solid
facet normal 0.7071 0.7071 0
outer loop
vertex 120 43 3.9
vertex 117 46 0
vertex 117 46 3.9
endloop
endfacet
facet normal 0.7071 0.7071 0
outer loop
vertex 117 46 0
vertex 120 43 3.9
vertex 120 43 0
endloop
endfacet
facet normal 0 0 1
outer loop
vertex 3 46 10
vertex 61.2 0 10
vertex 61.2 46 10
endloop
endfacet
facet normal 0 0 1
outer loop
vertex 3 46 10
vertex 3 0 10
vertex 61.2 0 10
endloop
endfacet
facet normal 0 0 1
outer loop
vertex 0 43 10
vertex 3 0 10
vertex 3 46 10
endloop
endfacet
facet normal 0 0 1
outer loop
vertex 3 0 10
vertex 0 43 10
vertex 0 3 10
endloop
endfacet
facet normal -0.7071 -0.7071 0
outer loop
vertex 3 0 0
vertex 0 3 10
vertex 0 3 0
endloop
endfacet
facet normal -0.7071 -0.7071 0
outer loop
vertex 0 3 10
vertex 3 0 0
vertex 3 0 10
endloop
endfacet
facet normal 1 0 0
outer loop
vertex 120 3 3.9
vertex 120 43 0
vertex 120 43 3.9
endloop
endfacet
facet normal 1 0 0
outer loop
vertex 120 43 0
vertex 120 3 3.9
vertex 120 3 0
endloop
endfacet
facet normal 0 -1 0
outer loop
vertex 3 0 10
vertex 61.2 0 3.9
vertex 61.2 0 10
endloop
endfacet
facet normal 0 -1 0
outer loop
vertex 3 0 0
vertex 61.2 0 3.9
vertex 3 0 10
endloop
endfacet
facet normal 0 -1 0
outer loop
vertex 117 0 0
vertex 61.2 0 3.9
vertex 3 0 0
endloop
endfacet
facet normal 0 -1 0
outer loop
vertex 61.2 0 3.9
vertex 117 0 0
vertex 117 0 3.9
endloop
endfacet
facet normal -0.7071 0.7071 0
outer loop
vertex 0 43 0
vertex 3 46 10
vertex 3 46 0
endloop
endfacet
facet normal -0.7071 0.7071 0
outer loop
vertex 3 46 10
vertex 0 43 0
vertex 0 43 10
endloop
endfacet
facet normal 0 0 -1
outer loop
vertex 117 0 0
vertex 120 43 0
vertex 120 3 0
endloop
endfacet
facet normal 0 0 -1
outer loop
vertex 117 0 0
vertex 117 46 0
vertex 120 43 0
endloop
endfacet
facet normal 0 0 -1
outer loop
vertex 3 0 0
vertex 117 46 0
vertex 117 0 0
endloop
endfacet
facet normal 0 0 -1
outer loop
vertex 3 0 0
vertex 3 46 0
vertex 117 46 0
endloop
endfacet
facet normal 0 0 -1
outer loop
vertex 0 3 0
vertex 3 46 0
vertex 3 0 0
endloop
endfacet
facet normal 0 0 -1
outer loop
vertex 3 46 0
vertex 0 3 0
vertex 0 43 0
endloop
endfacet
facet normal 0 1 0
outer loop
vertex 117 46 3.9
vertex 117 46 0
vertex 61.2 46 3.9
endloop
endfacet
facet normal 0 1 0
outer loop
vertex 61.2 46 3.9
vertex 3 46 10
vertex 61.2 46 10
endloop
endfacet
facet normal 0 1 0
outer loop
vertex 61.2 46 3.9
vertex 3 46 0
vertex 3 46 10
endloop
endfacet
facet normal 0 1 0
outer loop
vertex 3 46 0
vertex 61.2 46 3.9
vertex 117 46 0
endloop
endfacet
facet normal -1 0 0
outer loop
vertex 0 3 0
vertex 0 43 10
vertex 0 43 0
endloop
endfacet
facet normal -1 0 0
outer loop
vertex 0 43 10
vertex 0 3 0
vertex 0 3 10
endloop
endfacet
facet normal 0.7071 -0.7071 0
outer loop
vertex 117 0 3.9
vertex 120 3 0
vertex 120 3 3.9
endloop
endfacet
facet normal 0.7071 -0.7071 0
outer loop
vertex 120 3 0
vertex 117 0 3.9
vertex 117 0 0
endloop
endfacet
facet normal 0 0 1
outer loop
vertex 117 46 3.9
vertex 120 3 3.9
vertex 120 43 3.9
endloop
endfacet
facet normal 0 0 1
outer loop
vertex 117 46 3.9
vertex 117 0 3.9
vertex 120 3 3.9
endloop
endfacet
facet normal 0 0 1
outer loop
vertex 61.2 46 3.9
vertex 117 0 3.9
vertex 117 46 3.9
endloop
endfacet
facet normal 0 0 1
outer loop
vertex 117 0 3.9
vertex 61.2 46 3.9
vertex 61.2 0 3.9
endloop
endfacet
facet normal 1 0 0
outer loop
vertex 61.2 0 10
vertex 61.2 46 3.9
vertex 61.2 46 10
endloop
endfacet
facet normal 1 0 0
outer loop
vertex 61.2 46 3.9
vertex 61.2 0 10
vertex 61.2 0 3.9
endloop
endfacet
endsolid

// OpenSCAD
$fn = 32;

// ----------------------------------------------------------------------
// Stepped bar: endstep, 120 x 46 x 10/3.9 mm
// ----------------------------------------------------------------------

// --- parameters (mm) ---
bar_l = 120;              // bar length, X
bar_w = 46;               // bar width, Y
plate_t = 10;             // thickness of the thick zone, Z
thin_t = 3.9;             // thickness of the thin zone
corner_c = 3;             // corner chamfer of the bar
step_cut = 6.1;           // material removed from the thin zone
step_x = 61.2;            // step position from the left end
depth_1 = 6.1;            // depth of cut 1 from the top face

profile = [[3, 0], [117, 0], [120, 3], [120, 43], [117, 46], [3, 46], [0, 43], [0, 3]];  // primary outline, 8 points, counter clockwise
void_1 = [[61.2, -1], [121, -1], [121, 47], [61.2, 47]];  // thin zone beyond the step, 4 points

// --- the one profile operation ---
difference() {
  linear_extrude(height = plate_t) polygon(points = profile);
  translate([0, 0, plate_t - depth_1])
    linear_extrude(height = depth_1 + 1) polygon(points = void_1);
}
